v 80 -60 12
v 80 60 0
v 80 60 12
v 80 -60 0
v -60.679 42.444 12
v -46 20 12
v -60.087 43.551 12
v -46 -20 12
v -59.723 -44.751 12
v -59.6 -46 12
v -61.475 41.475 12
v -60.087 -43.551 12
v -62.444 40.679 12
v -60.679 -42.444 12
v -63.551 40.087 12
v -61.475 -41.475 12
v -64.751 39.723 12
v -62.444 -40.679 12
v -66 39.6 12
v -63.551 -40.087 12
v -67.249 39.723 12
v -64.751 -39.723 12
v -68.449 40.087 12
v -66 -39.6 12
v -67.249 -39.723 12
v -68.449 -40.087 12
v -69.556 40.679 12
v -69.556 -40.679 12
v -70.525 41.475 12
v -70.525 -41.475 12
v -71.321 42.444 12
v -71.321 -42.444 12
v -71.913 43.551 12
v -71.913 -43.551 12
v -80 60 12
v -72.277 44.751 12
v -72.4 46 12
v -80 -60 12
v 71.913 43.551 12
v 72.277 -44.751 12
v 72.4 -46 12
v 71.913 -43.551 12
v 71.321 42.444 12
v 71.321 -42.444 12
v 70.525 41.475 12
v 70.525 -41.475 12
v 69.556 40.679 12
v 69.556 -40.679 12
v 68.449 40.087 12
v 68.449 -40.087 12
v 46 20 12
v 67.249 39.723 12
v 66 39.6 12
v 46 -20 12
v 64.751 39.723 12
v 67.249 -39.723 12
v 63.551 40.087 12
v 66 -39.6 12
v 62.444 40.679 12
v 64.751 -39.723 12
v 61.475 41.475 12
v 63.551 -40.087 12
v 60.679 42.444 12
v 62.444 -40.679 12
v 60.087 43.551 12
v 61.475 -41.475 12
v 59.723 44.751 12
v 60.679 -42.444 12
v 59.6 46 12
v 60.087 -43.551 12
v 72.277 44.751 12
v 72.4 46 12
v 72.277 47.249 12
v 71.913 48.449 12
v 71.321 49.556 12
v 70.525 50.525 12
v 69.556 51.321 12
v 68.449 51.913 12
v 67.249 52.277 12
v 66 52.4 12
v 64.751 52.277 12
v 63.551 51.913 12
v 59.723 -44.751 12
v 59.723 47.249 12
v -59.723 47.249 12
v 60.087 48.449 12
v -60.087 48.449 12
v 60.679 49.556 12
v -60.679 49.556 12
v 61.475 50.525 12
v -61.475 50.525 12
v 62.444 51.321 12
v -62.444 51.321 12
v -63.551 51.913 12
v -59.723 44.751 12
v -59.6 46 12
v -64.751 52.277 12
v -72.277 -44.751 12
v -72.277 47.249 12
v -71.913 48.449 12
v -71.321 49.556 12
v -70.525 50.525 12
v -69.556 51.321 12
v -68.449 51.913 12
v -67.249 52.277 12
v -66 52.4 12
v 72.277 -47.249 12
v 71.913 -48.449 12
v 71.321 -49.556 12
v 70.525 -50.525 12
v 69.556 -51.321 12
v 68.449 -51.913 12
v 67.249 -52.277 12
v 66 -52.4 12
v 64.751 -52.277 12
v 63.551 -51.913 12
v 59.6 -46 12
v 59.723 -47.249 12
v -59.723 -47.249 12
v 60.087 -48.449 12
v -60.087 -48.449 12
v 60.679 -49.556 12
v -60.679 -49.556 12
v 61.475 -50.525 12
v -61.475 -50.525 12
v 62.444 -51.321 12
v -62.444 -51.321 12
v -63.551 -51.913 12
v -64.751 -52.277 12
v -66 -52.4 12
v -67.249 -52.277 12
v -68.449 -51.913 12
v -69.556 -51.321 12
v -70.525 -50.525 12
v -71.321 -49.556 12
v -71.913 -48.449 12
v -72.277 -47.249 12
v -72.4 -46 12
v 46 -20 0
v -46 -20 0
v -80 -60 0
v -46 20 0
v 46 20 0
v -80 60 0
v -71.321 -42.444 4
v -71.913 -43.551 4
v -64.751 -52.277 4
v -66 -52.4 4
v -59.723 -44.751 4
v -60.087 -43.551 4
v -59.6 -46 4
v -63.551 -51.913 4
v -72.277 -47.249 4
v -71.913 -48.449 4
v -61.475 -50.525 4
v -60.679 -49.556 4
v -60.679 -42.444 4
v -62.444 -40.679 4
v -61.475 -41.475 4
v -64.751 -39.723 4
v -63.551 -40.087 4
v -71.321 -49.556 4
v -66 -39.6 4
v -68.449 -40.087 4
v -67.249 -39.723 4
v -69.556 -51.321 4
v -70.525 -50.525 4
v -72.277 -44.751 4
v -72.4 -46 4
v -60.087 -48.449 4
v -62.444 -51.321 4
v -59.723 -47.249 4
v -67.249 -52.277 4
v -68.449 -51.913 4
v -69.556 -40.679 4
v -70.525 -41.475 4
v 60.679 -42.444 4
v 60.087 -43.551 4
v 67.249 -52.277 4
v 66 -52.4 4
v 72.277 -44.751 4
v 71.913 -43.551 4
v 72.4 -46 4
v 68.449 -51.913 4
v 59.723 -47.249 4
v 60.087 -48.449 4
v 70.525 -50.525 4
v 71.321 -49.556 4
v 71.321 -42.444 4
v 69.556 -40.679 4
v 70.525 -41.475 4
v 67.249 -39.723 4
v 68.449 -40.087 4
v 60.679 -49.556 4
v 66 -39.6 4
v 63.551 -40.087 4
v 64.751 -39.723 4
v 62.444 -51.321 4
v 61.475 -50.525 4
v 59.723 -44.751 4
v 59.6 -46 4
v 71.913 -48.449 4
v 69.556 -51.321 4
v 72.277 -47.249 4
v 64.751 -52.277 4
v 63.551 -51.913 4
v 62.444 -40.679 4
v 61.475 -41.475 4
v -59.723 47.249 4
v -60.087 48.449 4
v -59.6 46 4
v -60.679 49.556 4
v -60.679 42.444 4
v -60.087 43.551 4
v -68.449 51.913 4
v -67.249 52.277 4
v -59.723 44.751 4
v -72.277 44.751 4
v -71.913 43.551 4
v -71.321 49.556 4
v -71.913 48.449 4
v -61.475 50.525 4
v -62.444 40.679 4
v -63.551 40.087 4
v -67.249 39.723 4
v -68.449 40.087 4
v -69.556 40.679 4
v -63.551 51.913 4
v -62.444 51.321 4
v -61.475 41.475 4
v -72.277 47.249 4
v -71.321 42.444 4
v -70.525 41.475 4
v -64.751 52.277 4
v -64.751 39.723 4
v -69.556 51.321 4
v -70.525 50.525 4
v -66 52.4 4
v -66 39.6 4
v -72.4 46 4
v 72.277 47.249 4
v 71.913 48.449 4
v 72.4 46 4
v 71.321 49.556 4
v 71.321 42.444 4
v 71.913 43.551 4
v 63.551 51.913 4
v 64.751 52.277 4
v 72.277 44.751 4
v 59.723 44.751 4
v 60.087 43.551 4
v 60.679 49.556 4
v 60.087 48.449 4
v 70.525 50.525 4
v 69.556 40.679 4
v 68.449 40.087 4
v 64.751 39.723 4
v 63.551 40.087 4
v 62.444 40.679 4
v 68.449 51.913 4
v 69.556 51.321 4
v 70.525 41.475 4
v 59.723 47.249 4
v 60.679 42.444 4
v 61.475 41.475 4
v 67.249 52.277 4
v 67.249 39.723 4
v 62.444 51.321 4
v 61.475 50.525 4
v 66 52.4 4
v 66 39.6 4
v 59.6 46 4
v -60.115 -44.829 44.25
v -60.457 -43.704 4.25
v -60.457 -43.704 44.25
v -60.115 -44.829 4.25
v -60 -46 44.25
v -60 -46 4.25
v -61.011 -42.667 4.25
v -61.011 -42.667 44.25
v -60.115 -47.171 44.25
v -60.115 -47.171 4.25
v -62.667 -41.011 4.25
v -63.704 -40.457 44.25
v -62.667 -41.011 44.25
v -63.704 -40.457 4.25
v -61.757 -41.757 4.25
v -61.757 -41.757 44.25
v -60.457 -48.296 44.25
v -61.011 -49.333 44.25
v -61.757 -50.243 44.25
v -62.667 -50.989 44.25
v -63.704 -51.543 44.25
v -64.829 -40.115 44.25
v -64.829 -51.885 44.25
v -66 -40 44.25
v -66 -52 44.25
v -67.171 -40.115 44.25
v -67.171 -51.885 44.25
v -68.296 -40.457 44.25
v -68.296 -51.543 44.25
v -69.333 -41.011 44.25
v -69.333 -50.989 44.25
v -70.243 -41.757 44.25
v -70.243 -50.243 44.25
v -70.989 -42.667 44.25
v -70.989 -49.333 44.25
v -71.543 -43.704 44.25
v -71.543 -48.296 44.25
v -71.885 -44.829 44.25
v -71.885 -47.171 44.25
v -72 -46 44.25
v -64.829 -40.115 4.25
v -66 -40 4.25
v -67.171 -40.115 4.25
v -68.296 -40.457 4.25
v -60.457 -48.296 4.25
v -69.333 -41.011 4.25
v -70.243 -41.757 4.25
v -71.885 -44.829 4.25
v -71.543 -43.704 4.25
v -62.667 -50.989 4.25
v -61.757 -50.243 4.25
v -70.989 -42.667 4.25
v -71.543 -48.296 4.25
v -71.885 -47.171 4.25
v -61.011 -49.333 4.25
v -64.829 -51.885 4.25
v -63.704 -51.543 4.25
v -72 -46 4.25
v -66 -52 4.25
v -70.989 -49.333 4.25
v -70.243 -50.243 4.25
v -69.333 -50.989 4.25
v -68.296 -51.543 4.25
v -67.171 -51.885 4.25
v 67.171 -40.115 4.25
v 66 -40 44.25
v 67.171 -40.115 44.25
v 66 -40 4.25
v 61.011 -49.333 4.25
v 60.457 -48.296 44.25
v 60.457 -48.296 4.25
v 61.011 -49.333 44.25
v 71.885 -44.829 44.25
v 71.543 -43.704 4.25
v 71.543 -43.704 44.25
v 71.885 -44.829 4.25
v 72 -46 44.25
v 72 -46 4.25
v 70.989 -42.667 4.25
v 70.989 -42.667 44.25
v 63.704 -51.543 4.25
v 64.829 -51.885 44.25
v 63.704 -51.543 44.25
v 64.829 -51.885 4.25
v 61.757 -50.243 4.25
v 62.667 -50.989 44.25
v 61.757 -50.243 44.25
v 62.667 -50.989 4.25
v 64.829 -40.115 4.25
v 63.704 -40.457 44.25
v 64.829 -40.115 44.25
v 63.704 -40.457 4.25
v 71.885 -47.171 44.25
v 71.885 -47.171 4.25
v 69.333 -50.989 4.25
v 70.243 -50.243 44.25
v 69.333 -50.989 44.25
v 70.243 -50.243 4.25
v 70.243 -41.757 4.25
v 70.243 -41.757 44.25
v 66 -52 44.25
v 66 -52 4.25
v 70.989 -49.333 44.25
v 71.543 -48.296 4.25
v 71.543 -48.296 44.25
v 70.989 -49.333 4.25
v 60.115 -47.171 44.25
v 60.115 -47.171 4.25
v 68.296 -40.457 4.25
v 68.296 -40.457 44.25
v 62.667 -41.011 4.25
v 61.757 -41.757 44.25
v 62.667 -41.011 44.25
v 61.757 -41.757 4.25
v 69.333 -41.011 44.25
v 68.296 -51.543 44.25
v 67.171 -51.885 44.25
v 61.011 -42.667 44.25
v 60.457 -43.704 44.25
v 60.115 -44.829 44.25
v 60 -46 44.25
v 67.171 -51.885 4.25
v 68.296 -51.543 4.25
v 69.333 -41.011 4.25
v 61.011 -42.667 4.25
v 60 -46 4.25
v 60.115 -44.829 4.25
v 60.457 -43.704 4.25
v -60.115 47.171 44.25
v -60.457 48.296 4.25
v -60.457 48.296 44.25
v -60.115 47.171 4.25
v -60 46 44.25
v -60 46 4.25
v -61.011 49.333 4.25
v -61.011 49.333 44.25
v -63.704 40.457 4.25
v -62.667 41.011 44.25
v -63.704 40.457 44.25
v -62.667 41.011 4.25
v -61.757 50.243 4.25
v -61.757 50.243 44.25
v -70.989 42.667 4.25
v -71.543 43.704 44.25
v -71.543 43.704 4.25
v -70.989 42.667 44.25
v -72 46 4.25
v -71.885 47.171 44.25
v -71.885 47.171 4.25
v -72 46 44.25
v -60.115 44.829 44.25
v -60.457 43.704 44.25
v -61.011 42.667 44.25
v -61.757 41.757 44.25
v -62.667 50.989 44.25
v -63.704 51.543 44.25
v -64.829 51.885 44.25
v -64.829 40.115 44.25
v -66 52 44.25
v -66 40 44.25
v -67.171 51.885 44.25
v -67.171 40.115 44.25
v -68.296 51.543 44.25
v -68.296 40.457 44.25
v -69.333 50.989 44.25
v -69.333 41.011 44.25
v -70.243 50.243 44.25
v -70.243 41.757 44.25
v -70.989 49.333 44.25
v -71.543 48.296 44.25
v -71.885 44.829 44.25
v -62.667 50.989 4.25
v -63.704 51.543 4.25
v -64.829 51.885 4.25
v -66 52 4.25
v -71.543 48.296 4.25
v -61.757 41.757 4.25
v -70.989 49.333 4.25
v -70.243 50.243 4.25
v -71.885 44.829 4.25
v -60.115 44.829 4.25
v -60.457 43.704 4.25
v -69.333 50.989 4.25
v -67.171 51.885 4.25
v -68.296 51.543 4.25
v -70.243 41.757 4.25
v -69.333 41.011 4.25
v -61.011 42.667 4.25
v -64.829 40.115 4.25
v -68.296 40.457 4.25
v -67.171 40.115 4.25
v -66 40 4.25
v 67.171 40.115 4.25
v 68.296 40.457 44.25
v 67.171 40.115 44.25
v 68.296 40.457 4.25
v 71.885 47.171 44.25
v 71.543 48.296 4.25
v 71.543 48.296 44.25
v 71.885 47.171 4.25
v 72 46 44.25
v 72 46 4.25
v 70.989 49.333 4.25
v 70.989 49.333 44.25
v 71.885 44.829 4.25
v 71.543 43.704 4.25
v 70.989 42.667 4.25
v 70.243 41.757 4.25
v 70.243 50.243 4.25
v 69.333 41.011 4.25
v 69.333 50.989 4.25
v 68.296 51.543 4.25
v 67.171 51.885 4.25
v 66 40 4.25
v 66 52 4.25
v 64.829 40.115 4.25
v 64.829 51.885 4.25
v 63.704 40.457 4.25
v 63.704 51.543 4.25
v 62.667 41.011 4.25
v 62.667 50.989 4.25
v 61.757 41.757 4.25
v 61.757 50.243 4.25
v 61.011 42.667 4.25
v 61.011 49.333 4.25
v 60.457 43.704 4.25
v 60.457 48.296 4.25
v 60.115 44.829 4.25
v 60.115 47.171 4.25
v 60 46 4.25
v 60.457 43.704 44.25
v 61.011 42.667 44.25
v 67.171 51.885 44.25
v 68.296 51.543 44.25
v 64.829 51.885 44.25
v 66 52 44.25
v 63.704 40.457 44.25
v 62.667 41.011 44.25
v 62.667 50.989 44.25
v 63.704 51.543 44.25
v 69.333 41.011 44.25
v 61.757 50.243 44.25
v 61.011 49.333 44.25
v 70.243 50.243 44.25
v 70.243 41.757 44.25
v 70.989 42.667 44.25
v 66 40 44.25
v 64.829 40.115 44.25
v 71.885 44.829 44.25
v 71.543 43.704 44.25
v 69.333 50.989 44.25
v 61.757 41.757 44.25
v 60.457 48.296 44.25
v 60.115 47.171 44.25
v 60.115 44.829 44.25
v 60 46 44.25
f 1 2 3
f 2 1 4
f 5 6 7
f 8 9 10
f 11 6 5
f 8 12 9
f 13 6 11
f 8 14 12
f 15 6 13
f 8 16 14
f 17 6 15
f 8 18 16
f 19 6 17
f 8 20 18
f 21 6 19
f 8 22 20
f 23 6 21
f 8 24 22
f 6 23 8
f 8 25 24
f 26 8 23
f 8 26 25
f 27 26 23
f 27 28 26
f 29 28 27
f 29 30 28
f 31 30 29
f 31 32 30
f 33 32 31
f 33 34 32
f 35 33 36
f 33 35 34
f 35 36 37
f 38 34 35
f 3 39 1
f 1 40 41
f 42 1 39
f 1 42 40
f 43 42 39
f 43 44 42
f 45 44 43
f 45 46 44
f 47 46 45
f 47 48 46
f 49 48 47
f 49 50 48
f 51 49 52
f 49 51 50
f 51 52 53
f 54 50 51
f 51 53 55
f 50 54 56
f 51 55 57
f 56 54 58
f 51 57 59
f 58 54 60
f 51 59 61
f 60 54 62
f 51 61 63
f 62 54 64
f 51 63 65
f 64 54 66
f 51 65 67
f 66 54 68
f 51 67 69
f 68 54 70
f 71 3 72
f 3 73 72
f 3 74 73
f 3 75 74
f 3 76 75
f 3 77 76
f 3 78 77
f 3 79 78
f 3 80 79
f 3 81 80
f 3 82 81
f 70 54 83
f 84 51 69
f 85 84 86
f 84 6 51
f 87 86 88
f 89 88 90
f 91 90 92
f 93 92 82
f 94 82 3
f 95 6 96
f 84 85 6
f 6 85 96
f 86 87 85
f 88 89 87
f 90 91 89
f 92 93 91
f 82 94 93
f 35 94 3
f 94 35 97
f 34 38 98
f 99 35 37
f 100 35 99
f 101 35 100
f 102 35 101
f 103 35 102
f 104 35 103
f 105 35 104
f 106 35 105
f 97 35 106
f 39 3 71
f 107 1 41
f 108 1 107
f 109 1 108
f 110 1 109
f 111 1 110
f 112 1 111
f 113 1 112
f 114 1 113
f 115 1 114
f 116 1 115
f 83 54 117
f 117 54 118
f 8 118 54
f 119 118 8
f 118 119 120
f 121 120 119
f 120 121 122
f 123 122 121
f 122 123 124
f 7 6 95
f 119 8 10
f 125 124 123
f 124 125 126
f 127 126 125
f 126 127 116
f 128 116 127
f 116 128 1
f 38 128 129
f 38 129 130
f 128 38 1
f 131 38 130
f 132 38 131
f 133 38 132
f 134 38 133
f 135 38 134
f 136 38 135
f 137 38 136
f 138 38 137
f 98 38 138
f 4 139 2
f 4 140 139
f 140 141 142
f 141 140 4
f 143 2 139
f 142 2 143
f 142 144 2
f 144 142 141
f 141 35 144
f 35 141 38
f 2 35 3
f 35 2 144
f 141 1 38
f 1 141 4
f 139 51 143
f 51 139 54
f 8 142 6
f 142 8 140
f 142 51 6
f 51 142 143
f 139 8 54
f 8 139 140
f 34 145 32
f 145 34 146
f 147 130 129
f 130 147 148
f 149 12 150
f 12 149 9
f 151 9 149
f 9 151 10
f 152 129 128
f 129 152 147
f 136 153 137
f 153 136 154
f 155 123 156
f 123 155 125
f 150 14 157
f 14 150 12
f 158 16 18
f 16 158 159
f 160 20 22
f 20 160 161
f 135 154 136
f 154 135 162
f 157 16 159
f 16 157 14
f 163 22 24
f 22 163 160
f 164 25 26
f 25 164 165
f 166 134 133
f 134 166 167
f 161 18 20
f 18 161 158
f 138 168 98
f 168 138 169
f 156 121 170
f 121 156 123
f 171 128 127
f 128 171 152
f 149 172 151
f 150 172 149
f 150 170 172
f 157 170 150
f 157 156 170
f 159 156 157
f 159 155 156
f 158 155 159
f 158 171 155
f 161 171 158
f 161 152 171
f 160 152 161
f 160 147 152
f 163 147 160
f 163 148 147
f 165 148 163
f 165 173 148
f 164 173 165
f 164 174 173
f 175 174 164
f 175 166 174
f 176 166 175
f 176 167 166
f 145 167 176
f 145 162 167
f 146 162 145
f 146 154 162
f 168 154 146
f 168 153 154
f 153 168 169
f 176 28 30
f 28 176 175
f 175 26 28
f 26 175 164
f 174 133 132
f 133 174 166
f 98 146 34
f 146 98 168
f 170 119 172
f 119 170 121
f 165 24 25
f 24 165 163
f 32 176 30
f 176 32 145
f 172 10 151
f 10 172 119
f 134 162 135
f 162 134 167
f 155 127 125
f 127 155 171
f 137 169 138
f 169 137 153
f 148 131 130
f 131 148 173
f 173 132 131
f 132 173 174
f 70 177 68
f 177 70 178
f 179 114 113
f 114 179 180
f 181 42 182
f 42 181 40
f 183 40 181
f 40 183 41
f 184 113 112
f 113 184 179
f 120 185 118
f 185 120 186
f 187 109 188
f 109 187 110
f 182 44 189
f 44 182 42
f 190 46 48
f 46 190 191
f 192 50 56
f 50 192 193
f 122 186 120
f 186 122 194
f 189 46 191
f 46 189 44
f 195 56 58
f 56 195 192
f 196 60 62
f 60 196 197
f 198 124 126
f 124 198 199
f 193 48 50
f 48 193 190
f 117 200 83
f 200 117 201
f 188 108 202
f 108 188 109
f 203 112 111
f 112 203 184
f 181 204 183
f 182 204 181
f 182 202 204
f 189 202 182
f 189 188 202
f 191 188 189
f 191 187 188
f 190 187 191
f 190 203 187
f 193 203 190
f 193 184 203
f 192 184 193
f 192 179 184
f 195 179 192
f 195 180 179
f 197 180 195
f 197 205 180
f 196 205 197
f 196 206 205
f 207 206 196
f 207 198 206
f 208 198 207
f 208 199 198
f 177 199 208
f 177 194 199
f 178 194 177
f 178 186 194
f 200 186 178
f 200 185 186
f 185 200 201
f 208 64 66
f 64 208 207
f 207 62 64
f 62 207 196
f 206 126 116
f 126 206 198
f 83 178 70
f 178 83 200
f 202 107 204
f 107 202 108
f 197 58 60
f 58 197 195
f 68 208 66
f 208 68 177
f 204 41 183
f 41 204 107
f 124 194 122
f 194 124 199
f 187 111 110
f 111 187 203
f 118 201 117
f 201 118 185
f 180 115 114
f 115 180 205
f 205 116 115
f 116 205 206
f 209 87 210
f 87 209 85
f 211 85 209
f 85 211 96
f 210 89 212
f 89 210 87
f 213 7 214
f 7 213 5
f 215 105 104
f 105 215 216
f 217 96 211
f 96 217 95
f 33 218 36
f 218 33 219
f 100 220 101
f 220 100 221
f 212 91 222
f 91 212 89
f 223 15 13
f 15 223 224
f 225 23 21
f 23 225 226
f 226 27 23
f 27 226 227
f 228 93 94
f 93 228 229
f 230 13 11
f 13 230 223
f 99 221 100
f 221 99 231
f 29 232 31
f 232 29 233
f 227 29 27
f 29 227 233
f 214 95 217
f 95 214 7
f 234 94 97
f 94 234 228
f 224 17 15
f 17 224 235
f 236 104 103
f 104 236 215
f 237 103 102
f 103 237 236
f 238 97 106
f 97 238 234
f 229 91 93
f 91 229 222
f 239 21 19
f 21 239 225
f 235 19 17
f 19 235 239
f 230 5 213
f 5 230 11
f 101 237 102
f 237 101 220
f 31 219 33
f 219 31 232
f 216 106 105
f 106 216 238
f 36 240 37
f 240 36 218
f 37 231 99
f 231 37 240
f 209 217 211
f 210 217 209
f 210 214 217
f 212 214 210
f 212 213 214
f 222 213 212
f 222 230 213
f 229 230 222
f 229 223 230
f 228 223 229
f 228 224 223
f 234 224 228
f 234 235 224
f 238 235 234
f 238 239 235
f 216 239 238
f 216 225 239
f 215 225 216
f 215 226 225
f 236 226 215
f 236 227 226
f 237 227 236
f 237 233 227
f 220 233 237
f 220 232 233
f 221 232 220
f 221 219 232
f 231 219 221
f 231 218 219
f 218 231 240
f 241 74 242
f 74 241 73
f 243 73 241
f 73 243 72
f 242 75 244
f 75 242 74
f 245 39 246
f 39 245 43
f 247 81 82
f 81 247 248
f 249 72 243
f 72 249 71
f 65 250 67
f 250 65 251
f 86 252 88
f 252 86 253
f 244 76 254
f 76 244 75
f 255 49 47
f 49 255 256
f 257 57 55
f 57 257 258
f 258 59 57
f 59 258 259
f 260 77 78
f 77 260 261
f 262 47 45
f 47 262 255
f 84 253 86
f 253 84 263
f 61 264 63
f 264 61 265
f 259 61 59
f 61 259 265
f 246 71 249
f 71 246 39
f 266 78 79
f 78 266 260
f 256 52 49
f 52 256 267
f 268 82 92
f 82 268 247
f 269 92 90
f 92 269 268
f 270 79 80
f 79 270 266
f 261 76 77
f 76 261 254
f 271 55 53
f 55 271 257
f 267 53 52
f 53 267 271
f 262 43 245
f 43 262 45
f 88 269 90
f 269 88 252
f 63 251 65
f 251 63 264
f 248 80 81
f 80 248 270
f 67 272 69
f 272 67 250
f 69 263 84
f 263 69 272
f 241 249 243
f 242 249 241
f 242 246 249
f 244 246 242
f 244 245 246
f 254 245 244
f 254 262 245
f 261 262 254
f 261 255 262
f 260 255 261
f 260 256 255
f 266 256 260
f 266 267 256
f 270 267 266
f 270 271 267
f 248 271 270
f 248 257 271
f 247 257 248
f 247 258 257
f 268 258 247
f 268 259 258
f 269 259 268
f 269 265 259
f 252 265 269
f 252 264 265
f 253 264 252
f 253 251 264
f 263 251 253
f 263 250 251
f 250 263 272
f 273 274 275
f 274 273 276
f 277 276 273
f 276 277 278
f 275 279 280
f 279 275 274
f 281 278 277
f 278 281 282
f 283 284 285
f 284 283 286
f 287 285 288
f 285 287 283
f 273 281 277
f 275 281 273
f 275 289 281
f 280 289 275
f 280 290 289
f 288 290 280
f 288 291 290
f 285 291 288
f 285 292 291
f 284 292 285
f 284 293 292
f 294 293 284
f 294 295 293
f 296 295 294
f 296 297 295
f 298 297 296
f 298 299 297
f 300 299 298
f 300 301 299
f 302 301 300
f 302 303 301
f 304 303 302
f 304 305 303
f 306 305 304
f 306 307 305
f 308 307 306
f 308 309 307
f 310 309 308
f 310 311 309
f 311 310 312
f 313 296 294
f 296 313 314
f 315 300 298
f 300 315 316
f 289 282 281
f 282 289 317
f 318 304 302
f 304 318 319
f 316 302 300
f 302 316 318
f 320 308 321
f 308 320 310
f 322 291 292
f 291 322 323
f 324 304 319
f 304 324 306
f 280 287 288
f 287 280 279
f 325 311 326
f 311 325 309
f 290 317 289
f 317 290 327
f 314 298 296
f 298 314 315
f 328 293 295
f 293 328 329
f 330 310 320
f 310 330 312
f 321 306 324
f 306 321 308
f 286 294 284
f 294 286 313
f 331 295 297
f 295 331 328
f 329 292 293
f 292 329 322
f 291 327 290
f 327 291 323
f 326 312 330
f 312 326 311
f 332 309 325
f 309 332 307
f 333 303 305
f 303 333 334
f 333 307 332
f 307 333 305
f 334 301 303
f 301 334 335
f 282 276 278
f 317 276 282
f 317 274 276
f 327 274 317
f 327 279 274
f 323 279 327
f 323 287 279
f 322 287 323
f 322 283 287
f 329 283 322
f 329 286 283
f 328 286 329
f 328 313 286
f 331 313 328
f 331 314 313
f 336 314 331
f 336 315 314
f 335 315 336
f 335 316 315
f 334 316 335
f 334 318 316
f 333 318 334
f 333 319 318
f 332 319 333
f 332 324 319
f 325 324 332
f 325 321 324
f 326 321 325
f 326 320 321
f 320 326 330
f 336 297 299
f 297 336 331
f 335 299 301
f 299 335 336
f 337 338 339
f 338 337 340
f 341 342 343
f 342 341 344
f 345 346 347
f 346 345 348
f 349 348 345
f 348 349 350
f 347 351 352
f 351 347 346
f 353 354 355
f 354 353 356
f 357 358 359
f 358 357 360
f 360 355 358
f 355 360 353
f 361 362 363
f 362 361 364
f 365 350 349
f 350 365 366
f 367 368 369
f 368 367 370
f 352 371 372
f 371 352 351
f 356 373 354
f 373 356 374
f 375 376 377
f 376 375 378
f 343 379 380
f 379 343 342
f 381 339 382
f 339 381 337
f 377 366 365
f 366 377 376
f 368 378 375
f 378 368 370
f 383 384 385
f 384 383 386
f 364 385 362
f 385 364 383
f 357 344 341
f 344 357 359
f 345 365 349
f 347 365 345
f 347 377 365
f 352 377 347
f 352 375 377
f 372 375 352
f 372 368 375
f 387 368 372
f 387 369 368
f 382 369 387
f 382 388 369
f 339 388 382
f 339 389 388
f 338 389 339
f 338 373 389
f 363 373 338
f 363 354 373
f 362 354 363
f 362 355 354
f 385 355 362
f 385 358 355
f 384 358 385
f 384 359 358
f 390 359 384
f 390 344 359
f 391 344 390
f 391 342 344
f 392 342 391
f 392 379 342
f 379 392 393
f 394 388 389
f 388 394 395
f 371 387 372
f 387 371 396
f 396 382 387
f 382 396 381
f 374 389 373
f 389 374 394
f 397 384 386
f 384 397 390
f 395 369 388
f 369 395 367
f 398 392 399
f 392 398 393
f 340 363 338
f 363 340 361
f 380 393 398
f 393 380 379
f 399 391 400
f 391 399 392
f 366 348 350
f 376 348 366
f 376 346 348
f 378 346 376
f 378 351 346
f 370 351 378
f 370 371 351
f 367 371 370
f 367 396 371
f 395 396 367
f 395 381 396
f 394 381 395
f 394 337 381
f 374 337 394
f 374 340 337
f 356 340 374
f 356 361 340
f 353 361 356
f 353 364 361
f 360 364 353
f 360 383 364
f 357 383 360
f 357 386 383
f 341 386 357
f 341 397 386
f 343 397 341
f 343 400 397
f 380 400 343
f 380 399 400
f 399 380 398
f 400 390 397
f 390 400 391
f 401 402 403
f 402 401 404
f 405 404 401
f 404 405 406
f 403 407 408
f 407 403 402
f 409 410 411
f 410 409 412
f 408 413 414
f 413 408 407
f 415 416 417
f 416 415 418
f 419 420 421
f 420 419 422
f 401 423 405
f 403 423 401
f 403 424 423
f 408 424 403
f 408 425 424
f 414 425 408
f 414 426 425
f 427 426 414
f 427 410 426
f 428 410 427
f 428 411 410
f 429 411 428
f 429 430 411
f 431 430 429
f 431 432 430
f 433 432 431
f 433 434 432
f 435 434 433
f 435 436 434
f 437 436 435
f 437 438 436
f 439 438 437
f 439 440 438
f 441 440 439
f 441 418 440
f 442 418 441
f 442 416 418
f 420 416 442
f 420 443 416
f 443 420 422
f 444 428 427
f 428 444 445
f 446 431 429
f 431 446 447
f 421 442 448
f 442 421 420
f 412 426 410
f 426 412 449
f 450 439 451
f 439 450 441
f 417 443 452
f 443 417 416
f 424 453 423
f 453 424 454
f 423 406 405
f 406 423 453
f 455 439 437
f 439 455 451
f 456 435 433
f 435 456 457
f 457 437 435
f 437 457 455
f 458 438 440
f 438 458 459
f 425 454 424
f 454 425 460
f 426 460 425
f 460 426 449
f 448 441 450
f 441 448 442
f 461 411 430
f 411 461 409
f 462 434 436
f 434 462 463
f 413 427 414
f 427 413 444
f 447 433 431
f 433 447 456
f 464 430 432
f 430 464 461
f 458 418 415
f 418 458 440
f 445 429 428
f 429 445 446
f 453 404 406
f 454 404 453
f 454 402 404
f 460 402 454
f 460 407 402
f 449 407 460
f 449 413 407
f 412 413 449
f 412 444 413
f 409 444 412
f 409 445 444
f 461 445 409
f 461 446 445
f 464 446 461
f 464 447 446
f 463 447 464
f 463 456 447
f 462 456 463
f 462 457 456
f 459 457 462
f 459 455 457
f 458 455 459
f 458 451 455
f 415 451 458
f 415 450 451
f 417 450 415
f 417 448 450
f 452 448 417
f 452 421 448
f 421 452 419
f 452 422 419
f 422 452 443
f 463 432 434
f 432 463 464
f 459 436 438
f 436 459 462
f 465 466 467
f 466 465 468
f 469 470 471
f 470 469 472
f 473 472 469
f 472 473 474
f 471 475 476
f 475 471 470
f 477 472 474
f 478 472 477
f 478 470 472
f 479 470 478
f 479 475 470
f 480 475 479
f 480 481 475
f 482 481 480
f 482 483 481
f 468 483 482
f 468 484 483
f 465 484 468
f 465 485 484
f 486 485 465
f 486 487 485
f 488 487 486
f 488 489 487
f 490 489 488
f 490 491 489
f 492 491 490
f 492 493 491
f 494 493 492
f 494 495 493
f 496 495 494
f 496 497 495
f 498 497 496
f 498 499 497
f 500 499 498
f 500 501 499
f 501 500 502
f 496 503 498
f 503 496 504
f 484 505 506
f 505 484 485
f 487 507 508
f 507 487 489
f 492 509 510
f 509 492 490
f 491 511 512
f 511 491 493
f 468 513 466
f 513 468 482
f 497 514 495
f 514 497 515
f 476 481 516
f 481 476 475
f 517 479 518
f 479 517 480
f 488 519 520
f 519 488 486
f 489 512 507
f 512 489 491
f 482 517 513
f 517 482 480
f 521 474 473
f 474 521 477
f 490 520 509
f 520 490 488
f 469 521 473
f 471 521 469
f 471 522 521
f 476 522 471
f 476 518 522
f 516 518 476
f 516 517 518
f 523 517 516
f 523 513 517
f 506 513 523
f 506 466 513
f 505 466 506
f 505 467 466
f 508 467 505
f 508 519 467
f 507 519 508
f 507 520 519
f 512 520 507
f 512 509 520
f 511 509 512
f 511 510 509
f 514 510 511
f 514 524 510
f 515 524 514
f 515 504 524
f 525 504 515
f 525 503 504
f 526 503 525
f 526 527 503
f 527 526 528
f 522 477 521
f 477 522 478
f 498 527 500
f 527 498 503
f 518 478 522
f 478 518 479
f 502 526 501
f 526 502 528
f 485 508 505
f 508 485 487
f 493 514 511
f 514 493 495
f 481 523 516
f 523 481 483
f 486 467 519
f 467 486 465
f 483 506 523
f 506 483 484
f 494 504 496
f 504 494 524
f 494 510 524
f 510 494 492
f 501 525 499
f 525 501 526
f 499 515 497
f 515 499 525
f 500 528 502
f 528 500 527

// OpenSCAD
$fn = 32;

// ------------------------------------------------------------------------
// Frame with four posts: 160 x 120 mm frame, four d12 posts
// Every part is its own module, assembly() places them once.
// ------------------------------------------------------------------------

// --- part 1 ---
module base_frame() {
  difference() {
    translate([-80, -60, 0]) cube([160, 120, 12]);
    translate([-46, -20, -1]) cube([92, 40, 14]);
    translate([-66, -46, 4]) cylinder(h = 9, d = 12.8);
    translate([66, -46, 4]) cylinder(h = 9, d = 12.8);
    translate([-66, 46, 4]) cylinder(h = 9, d = 12.8);
    translate([66, 46, 4]) cylinder(h = 9, d = 12.8);
  }
}

// --- part 2 ---
module post1() {
  cylinder(h = 40, d = 12);
}

// --- part 3 ---
module post2() {
  cylinder(h = 40, d = 12);
}

// --- part 4 ---
module post3() {
  cylinder(h = 40, d = 12);
}

// --- part 5 ---
module post4() {
  cylinder(h = 40, d = 12);
}

// --- assembly ---
module assembly() {
  translate([0, 0, 0]) rotate([0, 0, 0]) base_frame();
  translate([-66, -46, 4.25]) rotate([0, 0, 0]) post1();
  translate([66, -46, 4.25]) rotate([0, 0, 0]) post2();
  translate([-66, 46, 4.25]) rotate([0, 0, 0]) post3();
  translate([66, 46, 4.25]) rotate([0, 0, 0]) post4();
}

assembly();
